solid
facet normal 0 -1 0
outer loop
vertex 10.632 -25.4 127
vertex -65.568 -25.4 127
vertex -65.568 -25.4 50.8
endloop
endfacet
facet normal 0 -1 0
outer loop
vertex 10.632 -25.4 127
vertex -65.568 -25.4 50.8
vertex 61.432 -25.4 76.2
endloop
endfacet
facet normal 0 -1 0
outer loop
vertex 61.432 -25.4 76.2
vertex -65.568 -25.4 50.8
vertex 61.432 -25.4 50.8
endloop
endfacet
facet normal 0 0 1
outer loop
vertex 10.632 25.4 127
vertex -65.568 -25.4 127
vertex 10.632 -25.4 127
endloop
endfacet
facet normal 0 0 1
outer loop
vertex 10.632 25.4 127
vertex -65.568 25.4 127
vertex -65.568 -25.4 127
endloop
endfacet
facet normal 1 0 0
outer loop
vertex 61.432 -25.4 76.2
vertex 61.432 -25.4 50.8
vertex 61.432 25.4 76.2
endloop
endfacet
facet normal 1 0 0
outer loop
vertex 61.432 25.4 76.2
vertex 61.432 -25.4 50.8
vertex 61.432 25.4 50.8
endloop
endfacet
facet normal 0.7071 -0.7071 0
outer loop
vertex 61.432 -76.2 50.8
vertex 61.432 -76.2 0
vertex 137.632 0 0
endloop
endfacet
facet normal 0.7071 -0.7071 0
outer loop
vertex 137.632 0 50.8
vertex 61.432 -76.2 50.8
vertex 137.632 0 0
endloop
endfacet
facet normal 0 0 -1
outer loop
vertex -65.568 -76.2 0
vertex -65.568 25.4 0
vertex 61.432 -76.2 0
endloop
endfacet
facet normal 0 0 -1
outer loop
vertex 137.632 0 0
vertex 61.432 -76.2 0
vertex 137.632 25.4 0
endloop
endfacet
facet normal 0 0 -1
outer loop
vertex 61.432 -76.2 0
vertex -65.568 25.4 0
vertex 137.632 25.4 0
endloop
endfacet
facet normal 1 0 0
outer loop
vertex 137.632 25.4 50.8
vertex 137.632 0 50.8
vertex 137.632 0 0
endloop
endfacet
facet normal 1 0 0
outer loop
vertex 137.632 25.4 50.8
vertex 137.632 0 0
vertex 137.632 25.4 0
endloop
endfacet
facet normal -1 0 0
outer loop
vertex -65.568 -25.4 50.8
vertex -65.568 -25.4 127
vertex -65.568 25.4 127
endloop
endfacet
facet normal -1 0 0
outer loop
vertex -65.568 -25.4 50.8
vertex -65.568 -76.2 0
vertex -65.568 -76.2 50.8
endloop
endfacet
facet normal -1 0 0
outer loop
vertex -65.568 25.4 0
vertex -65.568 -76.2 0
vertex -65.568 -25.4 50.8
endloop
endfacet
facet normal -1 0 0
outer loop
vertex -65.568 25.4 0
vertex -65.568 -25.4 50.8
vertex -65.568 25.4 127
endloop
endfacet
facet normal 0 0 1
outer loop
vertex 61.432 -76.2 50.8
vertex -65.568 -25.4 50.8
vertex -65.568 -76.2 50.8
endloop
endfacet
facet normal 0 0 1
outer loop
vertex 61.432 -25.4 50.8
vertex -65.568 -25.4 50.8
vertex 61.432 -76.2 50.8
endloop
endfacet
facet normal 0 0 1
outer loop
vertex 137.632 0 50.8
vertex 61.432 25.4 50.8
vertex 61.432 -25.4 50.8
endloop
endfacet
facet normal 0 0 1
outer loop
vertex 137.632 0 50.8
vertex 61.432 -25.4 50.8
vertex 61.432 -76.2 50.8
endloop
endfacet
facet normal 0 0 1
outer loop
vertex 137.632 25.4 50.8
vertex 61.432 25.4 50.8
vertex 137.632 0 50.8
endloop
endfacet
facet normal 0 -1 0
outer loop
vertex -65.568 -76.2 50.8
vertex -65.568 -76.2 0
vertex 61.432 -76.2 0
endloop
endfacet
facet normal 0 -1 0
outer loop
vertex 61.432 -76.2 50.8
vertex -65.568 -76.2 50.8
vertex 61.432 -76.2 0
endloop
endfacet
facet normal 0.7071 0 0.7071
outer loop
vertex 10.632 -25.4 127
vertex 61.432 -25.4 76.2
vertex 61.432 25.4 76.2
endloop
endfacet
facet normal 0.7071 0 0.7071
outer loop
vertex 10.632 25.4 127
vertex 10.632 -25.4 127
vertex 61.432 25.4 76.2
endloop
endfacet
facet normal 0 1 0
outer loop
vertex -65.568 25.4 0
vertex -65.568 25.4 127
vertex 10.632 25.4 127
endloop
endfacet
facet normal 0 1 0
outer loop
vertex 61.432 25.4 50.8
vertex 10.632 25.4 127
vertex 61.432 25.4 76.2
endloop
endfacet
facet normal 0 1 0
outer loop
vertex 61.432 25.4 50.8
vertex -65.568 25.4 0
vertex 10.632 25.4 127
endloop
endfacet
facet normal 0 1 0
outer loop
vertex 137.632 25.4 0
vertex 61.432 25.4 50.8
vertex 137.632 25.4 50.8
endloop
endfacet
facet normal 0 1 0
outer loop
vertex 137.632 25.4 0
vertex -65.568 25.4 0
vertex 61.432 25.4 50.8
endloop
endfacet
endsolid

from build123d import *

# Parameters (mm, degrees)
F1_DEPTH = 50.8
F2_W     = 127
F2_H     = 50.8
F3_DEPTH = 76.2
F4_SIZE  = 50.8


with BuildPart() as f1:
    # F0 (on Top) → F1 (new body)
    with BuildSketch(Plane.XY):
        Polygon((-65.568145, 25.4), (-65.568145, -76.2), (61.431855, -76.2), (137.631855, 0), (137.631855, 25.4), align=None)
    extrude(amount=F1_DEPTH)

    # F2 (on face) → F3 (join)
    with BuildSketch(Plane.XY.offset(50.8)):
        with Locations((-2.068145, 0)):
            Rectangle(F2_W, F2_H)
    extrude(amount=F3_DEPTH)

    # F4
    f4_edges = [f1.edges().sort_by_distance(p)[0] for p in [
        (61.431855, 0, 127),
    ]]
    chamfer(f4_edges, length=F4_SIZE)


solid = f1.part
